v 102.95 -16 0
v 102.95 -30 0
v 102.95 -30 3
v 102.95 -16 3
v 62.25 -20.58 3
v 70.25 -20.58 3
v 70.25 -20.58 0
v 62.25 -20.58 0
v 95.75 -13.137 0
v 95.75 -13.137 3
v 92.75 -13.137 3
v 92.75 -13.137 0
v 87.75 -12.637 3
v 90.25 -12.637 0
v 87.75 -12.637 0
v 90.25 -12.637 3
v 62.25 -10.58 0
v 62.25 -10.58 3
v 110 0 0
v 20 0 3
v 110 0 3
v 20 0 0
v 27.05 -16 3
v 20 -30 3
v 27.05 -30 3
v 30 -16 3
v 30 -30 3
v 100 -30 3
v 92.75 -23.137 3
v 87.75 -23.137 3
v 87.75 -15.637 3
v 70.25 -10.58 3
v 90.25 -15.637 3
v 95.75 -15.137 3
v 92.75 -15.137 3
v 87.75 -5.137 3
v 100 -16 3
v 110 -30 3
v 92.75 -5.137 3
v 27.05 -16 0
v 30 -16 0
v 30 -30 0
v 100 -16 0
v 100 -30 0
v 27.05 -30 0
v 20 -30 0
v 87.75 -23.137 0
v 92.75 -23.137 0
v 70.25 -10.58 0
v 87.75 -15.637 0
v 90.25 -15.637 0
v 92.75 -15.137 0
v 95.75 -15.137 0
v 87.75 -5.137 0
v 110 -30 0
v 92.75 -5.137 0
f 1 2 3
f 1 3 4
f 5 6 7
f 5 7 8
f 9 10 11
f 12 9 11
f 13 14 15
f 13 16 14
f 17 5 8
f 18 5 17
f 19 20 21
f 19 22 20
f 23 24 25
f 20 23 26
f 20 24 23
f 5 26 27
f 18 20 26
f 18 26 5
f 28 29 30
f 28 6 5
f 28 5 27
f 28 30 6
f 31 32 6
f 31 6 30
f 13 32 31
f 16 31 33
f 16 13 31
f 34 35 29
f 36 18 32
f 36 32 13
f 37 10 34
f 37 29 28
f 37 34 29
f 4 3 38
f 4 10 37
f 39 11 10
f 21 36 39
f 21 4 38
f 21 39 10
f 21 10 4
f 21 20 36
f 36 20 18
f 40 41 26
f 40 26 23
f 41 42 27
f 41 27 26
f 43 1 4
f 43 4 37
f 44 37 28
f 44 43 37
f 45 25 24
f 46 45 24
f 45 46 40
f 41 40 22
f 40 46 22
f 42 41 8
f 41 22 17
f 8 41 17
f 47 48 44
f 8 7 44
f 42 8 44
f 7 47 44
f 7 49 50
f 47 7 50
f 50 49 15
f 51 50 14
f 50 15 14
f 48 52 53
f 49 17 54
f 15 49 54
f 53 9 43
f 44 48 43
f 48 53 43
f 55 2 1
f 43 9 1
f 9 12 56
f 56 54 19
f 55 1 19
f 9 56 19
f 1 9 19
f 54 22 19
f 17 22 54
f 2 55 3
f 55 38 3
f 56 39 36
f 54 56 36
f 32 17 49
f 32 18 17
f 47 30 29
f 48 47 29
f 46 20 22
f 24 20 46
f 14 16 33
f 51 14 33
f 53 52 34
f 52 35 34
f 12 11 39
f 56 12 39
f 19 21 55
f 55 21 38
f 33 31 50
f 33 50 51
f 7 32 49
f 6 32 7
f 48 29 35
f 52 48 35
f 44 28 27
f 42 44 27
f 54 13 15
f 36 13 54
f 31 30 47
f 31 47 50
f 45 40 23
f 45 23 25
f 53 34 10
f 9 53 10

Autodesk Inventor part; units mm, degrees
ref_plane "YZ Plane" through (0, 0, 0) normal (1, 0, 0) x (0, 1, 0)
ref_plane "XZ Plane" through (0, 0, 0) normal (0, 1, 0) x (-1, 0, 0)
ref_plane "XY Plane" through (0, 0, 0) normal (0, 0, 1) x (1, 0, 0)
sketch "草圖1" plane through (0, 0, 0) normal (0, 0, 1) x (1, 0, 0)
  line L0 (0, 0) -> (130, 0)
  line L1 (130, 0) -> (130, -27)
  line L2 (130, -27) -> (0, -27)
  line L3 (0, -27) -> (0, 0)
  line L4 (27.05, -27) -> (30, -27)
  line L5 (30, -27) -> (30, -16)
  line L6 (30, -16) -> (27.05, -16)
  line L7 (27.05, -16) -> (27.05, -27)
  line L8 (100, -27) -> (102.95, -27)
  line L9 (102.95, -27) -> (102.95, -16)
  line L10 (102.95, -16) -> (100, -16)
  line L11 (100, -16) -> (100, -27)
  line L12 (30, -16) -> (100, -16)
  point P0 (65, -16)
  point P1 (65, -27)
  dimension "d0" = 70
  dimension "d1" = 130
  dimension "d2" = 2.95
  dimension "d3" = 2.95
  dimension "d4" = 11
  dimension "d5" = 27
extrude "擠出1" add sketch "草圖1" along normal blind 3 contours L0 L1 L2 L9 L10 L12 L6 L7 L3 | L5 L12 L11 L2
sketch "草圖4" plane through (0, 0, 3) normal (0, 0, 1) x (1, 0, 0)
  line L0 (0, -27) -> (27.05, -27) projected
  line L1 (0, -27) -> (130, -27)
  line L2 (130, -27) -> (130, -30)
  line L3 (130, -30) -> (0, -30)
  line L4 (0, -30) -> (0, -27)
  line L5 (100, -27) -> (100, -16) projected
  line L6 (100, -27) -> (100, -30)
  line L7 (102.95, -16) -> (102.95, -27) projected
  line L8 (102.95, -27) -> (102.95, -30)
  line L9 (27.05, -27) -> (27.05, -30)
  line L10 (30, -27) -> (100, -27) projected
  line L11 (30, -27) -> (30, -30)
  line L12 (102.95, -27) -> (130, -27) projected
  line L13 (110, -27) -> (130, -27)
  line L14 (130, -27) -> (130, 0) projected
  dimension "d49" = 3
extrude "擠出4" add sketch "草圖4" against normal up to surface (3 mm away) contours L0 L9 L3 L4 | L1 L6 L3 L11 | L1 L2 L3 L8
sketch "草圖5" plane through (0, 0, 3) normal (0, 0, 1) x (1, 0, 0)
  line L0 (130, 0) -> (0, 0) projected
  line L1 (0, 0) -> (0, -30) projected
  line L2 (0, -30) -> (27.05, -30) projected
  line L3 (27.05, -30) -> (27.05, -16) projected
  line L4 (27.05, -16) -> (30, -16) projected
  line L5 (30, -16) -> (30, -30) projected
  line L6 (30, -30) -> (100, -30) projected
  line L7 (100, -30) -> (100, -16) projected
  line L8 (100, -16) -> (102.95, -16) projected
  line L9 (102.95, -16) -> (102.95, -30) projected
  line L10 (102.95, -30) -> (130, -30) projected
  line L11 (130, -30) -> (130, 0) projected
  line L12 (130, -30) -> (102.95, -30) projected
  line L13 (130, 0) -> (110, 0)
  line L14 (110, 0) -> (110, -30)
  line L15 (110, -30) -> (130, -30)
  line L16 (130, -30) -> (130, 0)
  line L17 (0, -30) -> (0, 0)
  line L18 (0, 0) -> (20, 0)
  line L19 (20, 0) -> (20, -30)
  line L20 (20, -30) -> (0, -30)
  point P0 (130, -15)
  dimension "d33" = 20
  dimension "d51" = 20
extrude "擠出5" cut sketch "草圖5" against normal up to surface (3 mm away) contours L11 L10 L14 L0 | L19 L2 L1 L0
sketch "草圖7" plane through (0, 0, 3) normal (0, 0, 1) x (1, 0, 0)
  line L0 (90.25, -5.137) -> (90.25, -23.137)
  line L1 (90.25, -23.137) -> (92.75, -23.137)
  line L2 (92.75, -23.137) -> (92.75, -5.137)
  line L3 (92.75, -5.137) -> (90.25, -5.137)
  line L4 (100, -30) -> (100, -16) projected
  line L5 (100, -16) -> (102.95, -16) projected
  line L6 (90.25, -5.137) -> (90.25, -12.637)
  line L7 (90.25, -12.637) -> (87.75, -12.637)
  line L8 (87.75, -12.637) -> (87.75, -5.137)
  line L9 (87.75, -5.137) -> (90.25, -5.137)
  line L10 (90.25, -15.637) -> (90.25, -23.137)
  line L11 (90.25, -23.137) -> (87.75, -23.137)
  line L12 (87.75, -23.137) -> (87.75, -15.637)
  line L13 (87.75, -15.637) -> (90.25, -15.637)
  line L14 (92.75, -15.137) -> (95.75, -15.137)
  line L15 (95.75, -15.137) -> (95.75, -13.137)
  line L16 (95.75, -13.137) -> (92.75, -13.137)
  line L17 (92.75, -13.137) -> (92.75, -15.137)
  line L18 (102.95, -5.137) -> (102.95, -23.137)
  line L19 (102.95, -23.137) -> (105.45, -23.137)
  line L20 (105.45, -23.137) -> (105.45, -5.137)
  line L21 (105.45, -5.137) -> (102.95, -5.137)
  line L22 (102.95, -16) -> (102.95, -30) projected
  line L23 (30, -30) -> (100, -30) projected
  line L24 (62.25, -10.5805) -> (70.25, -10.5805)
  line L25 (70.25, -10.5805) -> (70.25, -20.5805)
  line L26 (70.25, -20.5805) -> (62.25, -20.5805)
  line L27 (62.25, -20.5805) -> (62.25, -10.5805)
  point P0 (0, 0)
  point P1 (91.5, -5.137)
  point P2 (95.75, -14.137)
  point P3 (92.75, -14.137)
  point P4 (66.25, -20.5805)
  dimension "d36" = 7.25
  dimension "d37" = 2.5
  dimension "d38" = 18
  dimension "d40" = 18
  dimension "d41" = 2.5
  dimension "d42" = 7.5
  dimension "d43" = 7.5
  dimension "d44" = 2.5
  dimension "d45" = 2
  dimension "d46" = 3
  dimension "d50" = 6.863
  dimension "d52" = 10
  dimension "d53" = 8
  dimension "d54" = 20
extrude "擠出6" cut sketch "草圖7" against normal up to surface (3 mm away) contours L3 L2 L1 L0 | L0 L7 L8 L9 | L0 L11 L12 L13 | L16 L15 L14 L2 | L24 L25 L26 L27
sketch "草圖9" plane through (0, 0, 3) normal (0, 0, 1) x (1, 0, 0)
  line L0 (102.95, -16) -> (102.95, -30) projected
  line L1 (102.95, -30) -> (110, -30) projected
  line L2 (110, -30) -> (110, 0) projected
  line L3 (110, 0) -> (20, 0) projected
  line L4 (20, 0) -> (20, -30) projected
  line L5 (20, -30) -> (27.05, -30) projected
  line L6 (27.05, -30) -> (27.05, -16) projected
  line L7 (27.05, -16) -> (30, -16) projected
  line L8 (30, -16) -> (30, -30) projected
  line L9 (30, -30) -> (100, -30) projected
  line L10 (100, -30) -> (100, -16) projected
  line L11 (100, -16) -> (102.95, -16) projected
  line L12 (95.75, -15.137) -> (92.75, -15.137) projected
  line L13 (92.75, -15.137) -> (92.75, -23.137) projected
  line L14 (92.75, -23.137) -> (87.75, -23.137) projected
  line L15 (87.75, -23.137) -> (87.75, -15.637) projected
  line L16 (87.75, -15.637) -> (90.25, -15.637) projected
  line L17 (90.25, -15.637) -> (90.25, -12.637) projected
  line L18 (90.25, -12.637) -> (87.75, -12.637) projected
  line L19 (87.75, -12.637) -> (87.75, -5.137) projected
  line L20 (87.75, -5.137) -> (92.75, -5.137) projected
  line L21 (92.75, -5.137) -> (92.75, -13.137) projected
  line L22 (92.75, -13.137) -> (95.75, -13.137) projected
  line L23 (95.75, -13.137) -> (95.75, -15.137) projected
  line L24 (70.25, -20.5805) -> (62.25, -20.5805) projected
  line L25 (62.25, -20.5805) -> (62.25, -10.5805) projected
  line L26 (62.25, -10.5805) -> (70.25, -10.5805) projected
  line L27 (70.25, -10.5805) -> (70.25, -20.5805) projected
  point P0 (0, 0)
